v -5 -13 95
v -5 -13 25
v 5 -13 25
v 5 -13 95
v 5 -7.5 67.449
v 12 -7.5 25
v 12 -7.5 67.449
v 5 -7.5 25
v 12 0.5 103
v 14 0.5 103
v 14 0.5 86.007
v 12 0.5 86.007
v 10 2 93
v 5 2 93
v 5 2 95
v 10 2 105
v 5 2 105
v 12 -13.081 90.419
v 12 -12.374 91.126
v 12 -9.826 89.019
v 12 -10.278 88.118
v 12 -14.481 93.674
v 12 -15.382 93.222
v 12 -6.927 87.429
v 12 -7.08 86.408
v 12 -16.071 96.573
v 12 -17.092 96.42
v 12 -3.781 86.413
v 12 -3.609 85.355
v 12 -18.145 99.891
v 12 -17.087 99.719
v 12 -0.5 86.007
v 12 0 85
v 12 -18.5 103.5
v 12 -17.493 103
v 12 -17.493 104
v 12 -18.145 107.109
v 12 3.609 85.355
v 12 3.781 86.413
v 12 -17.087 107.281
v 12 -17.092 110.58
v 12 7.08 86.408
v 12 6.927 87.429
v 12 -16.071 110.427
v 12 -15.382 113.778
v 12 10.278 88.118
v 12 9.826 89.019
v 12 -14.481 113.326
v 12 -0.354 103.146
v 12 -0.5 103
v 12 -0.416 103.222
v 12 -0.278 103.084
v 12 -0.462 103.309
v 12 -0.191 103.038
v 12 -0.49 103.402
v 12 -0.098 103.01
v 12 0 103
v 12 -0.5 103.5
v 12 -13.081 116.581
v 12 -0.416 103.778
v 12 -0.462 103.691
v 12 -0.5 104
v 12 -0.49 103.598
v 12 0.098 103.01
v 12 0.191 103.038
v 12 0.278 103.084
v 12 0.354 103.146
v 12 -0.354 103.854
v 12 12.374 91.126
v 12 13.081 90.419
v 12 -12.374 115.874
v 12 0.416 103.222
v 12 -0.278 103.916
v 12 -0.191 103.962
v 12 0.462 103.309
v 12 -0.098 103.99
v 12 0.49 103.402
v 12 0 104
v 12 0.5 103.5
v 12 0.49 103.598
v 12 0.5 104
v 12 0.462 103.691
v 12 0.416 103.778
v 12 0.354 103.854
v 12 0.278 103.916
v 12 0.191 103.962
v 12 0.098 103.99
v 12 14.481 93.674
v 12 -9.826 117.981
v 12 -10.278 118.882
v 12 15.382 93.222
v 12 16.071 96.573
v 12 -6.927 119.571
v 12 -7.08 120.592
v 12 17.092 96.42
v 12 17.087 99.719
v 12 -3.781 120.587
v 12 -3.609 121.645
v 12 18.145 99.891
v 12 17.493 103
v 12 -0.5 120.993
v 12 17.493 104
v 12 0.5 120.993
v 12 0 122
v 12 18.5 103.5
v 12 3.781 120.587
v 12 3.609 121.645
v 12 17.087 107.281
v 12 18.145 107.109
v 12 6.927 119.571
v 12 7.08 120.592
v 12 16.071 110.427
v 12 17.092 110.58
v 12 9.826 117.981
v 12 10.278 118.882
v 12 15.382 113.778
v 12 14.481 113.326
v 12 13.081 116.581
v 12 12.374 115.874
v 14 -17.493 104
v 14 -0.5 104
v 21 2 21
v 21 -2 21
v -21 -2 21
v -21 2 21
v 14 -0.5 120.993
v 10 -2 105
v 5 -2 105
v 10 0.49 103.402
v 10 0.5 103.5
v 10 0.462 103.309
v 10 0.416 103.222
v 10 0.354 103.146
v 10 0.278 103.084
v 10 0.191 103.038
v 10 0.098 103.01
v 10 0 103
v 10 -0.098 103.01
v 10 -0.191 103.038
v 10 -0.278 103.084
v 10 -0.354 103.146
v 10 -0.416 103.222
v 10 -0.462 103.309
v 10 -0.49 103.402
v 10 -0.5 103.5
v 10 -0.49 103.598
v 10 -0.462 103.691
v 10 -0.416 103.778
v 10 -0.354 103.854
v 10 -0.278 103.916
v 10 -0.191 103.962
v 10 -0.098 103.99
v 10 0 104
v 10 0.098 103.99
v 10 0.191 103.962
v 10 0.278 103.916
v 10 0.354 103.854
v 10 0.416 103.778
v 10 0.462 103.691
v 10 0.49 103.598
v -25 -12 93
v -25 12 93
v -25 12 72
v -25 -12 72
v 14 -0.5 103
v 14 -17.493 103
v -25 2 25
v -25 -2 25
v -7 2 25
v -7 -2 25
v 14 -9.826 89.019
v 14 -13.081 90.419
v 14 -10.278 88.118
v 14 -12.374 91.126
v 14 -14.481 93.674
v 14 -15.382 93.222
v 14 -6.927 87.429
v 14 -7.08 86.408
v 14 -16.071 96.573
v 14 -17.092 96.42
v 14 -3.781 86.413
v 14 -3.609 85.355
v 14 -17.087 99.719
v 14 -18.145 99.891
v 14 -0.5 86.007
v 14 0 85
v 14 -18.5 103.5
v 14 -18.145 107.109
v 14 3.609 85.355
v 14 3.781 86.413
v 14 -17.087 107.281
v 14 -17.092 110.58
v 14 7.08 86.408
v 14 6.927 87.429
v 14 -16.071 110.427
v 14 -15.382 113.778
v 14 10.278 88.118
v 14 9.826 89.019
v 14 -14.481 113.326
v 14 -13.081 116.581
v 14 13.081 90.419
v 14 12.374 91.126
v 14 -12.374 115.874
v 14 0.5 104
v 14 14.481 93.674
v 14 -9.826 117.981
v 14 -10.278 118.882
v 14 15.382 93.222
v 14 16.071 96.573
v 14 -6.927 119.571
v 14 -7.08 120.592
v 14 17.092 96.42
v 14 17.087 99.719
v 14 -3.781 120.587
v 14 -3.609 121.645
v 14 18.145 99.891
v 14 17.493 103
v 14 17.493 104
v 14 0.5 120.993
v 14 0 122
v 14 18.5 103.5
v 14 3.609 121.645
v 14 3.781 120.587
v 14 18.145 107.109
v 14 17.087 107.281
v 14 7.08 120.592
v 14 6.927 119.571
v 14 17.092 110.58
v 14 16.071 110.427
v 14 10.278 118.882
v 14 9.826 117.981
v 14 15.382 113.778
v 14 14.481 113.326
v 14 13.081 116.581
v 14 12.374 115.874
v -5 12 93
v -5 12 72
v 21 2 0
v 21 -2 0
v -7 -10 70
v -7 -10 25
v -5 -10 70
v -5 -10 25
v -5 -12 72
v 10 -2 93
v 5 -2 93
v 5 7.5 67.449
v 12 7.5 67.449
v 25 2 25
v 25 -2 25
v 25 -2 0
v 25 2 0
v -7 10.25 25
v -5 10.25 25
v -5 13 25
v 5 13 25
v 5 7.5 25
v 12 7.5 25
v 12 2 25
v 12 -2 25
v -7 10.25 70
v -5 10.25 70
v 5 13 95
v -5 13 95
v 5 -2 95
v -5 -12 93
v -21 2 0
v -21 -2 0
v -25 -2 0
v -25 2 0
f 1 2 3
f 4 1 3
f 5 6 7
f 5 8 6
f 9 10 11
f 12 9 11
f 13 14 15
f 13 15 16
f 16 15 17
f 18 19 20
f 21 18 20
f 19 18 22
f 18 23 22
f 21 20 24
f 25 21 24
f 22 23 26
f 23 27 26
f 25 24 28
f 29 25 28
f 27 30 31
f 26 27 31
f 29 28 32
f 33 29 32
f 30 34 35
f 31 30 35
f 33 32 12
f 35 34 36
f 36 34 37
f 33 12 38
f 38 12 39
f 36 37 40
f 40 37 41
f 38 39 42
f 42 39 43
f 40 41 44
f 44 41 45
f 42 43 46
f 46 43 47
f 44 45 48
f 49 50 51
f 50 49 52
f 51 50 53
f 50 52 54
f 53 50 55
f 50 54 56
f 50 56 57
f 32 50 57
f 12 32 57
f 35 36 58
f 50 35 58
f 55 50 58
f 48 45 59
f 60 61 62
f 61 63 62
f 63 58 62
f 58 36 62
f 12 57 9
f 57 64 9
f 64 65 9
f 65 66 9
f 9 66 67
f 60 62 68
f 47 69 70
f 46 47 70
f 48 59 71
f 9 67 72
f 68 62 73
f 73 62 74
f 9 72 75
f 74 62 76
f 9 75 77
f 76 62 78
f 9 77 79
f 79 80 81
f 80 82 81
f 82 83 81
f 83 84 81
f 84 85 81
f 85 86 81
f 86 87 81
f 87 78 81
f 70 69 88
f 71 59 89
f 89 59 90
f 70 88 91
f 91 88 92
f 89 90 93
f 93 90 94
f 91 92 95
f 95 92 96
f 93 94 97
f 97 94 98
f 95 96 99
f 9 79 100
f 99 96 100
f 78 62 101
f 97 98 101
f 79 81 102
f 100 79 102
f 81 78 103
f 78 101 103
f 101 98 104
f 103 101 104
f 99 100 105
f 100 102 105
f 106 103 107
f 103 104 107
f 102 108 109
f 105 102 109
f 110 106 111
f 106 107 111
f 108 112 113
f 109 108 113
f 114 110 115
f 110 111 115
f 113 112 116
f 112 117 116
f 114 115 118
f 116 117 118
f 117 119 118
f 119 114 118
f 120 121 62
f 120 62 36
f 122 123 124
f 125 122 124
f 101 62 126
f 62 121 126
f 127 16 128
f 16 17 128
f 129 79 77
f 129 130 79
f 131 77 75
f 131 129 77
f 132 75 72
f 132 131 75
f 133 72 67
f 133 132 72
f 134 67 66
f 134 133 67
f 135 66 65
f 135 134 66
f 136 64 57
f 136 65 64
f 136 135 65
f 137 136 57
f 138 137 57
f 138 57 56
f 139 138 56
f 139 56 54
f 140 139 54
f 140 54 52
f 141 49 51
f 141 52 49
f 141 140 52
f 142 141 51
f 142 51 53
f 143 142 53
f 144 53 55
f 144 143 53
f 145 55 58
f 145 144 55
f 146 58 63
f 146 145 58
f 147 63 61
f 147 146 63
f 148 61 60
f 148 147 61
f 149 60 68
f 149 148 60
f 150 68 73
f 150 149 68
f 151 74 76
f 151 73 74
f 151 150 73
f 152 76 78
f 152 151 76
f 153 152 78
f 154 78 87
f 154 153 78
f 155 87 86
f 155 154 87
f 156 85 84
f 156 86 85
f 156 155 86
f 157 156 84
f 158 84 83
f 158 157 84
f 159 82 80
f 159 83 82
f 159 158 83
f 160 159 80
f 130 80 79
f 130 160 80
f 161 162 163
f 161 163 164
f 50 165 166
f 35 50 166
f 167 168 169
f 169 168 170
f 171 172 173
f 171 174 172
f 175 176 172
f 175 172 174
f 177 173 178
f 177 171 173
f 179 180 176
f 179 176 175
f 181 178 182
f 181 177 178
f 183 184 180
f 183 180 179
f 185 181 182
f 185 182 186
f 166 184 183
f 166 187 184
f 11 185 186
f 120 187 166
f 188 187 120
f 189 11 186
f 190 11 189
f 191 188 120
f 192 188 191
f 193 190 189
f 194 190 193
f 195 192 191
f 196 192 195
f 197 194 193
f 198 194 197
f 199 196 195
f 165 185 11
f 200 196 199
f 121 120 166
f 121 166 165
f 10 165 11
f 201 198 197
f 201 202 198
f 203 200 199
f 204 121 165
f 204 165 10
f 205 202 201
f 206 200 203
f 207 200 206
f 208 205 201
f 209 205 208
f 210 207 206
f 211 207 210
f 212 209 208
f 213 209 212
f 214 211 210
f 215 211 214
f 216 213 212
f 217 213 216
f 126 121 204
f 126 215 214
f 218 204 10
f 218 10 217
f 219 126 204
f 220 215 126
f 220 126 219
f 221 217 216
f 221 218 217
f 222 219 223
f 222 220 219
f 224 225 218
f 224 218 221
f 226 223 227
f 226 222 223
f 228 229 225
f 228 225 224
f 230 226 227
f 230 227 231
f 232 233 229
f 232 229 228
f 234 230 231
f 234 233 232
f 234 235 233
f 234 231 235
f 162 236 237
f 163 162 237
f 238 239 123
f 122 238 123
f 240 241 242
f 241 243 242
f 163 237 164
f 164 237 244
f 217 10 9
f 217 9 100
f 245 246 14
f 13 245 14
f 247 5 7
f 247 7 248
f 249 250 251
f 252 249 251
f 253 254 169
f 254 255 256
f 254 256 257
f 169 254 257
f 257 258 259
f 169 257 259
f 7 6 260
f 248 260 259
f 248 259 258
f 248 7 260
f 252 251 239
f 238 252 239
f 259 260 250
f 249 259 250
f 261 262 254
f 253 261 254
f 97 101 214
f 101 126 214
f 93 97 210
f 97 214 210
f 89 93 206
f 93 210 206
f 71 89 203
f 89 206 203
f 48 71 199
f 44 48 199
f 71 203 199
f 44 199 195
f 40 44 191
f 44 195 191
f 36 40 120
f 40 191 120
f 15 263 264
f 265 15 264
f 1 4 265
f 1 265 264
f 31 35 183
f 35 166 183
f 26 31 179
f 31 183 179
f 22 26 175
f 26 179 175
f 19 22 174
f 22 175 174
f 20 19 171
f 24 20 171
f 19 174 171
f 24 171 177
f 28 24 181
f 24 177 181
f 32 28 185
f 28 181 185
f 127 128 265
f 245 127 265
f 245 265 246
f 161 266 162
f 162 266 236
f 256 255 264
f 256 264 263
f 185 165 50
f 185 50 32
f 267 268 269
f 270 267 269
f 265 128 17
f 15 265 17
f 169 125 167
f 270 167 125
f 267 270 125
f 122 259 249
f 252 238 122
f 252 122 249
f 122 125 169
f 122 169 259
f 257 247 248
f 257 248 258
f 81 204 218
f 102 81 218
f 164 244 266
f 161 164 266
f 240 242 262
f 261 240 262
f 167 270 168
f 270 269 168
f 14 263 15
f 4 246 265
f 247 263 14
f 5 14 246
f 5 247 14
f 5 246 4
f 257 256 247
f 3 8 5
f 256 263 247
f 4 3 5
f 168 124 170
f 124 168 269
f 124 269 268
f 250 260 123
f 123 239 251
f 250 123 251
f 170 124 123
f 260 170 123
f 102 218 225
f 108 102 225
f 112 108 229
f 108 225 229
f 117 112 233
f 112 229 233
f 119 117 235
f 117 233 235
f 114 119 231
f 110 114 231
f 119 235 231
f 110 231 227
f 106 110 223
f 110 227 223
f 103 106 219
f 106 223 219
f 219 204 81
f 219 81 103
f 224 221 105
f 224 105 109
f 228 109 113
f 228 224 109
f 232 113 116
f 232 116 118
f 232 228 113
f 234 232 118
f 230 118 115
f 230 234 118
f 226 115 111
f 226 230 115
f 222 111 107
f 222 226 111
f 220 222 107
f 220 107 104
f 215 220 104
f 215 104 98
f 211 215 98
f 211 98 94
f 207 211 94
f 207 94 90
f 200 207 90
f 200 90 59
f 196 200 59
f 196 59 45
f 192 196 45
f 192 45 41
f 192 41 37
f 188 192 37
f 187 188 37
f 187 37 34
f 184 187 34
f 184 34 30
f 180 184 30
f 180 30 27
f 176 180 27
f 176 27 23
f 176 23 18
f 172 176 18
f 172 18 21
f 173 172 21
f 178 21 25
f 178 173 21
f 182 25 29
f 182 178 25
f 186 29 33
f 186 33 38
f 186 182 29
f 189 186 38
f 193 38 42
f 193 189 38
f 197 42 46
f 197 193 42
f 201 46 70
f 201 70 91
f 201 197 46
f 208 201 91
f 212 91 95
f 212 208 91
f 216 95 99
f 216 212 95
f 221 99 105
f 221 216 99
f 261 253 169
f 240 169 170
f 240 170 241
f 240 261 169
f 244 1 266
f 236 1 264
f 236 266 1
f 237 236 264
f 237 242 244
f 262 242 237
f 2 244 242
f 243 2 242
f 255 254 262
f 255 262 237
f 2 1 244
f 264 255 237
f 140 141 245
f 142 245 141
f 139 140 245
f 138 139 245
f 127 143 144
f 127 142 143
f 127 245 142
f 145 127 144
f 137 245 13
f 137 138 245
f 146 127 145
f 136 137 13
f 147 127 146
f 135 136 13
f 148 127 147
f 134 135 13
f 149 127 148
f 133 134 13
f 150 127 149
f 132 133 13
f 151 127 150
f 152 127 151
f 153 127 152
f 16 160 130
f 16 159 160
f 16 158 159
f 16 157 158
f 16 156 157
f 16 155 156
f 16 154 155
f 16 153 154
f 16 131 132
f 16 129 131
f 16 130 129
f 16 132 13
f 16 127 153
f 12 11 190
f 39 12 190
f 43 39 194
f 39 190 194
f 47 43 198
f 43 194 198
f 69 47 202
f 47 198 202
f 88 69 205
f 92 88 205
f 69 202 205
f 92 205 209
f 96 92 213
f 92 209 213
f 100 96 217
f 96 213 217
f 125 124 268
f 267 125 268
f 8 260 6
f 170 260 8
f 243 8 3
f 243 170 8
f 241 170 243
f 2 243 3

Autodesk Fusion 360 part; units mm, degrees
sketch "스케치1" plane through (0, 0, 0) normal (0, 1, 0) x (1, 0, 0)
  line L0 (-25, 0) -> (-25, -25)
  line L1 (-25, -25) -> (25, -25)
  line L2 (25, -25) -> (25, 0)
  line L3 (25, 0) -> (21, 0)
  line L4 (21, 0) -> (21, -21)
  line L5 (21, -21) -> (-21, -21)
  line L6 (-21, -21) -> (-21, 0)
  line L7 (-21, 0) -> (-25, 0)
extrude "돌출1" add sketch "스케치1" along normal mid plane 4
sketch "스케치2" plane through (0, 0, 25) normal (0, 0, 1) x (-1, 0, 0)
  line L0 (25, 2) -> (-25, 2)
  line L1 (5, -13) -> (-5, -13)
  line L2 (5, -13) -> (5, 0)
  line L3 (-5, -13) -> (-5, 0)
  line L4 (-20, 0) -> (-2.5, 0)
  line L5 (5, 13) -> (-5, 13)
  line L6 (5, 13) -> (5, 0)
  line L7 (-5, 13) -> (-5, 0)
extrude "돌출2" add sketch "스케치2" along normal blind 70
sketch "스케치4" plane through (5, 0, 0) normal (1, 0, 0) x (0, 1, 0)
  line L0 (7.5, 25) -> (-7.5, 25)
  line L1 (-7.5, 25) -> (-7.5, 67.4494)
  line L2 (-7.5, 67.4494) -> (7.5, 67.4494)
  line L3 (7.5, 67.4494) -> (7.5, 25)
  line L4 (2, 25) -> (13, 25)
extrude "돌출3" add sketch "스케치4" along normal blind 7
sketch "스케치5" plane through (-5, 0, 0) normal (-1, 0, 0) x (0, -1, 0)
  line L0 (-10.25, 25) -> (10, 25)
  line L1 (10, 25) -> (10, 70)
  line L2 (10, 70) -> (-10.25, 70)
  line L3 (-10.25, 70) -> (-10.25, 25)
  line L4 (-7.5, 25) -> (-13, 25)
extrude "돌출4" add sketch "스케치5" along normal blind 2
sketch "스케치7" plane through (-5, 0, 0) normal (-1, 0, 0) x (0, -1, 0)
  line L0 (-12, 72) -> (12, 72)
  line L1 (12, 72) -> (12, 93)
  line L2 (12, 93) -> (-12, 93)
  line L3 (-12, 93) -> (-12, 72)
extrude "돌출5" add sketch "스케치7" along normal blind 20
sketch "스케치10" plane through (5, 0, 0) normal (1, 0, 0) x (0, 1, 0)
  line L0 (-2, 93) -> (2, 93)
  line L1 (2, 93) -> (2, 105)
  line L2 (2, 105) -> (-2, 105)
  line L3 (-2, 105) -> (-2, 93)
  line L4 (-12, 93) -> (12, 93)
extrude "돌출7" add sketch "스케치10" along normal blind 5
sketch "스케치12" plane through (10, 0, 0) normal (1, 0, 0) x (0, 1, 0)
  circle A0 centre (0, 103.5) radius 0.5
extrude "돌출8" add sketch "스케치12" along normal blind 4
sketch "스케치13" plane through (14, 0, 0) normal (1, 0, 0) x (0, 1, 0)
  circle A0 centre (0, 103.5) radius 18.5
  circle A1 centre (0, 103.5) radius 0.5
  line L0 (-0.5, 104) -> (-0.5, 120.9929)
  line L1 (0.5, 104) -> (0.5, 120.9929)
  line L2 (-0.5, 103) -> (-17.4929, 103)
  line L3 (-0.5, 104) -> (-17.4929, 104)
  line L4 (0.5, 103) -> (0.5, 86.0071)
  line L5 (-0.5, 103) -> (-0.5, 86.0071)
  line L6 (0.5, 104) -> (17.4929, 104)
  line L7 (0.5, 103) -> (17.4929, 103)
  arc A2 (-0.5, 103.5) -> (0, 103) centre (0, 103.5) ccw
  arc A3 (-0.5, 120.9929) -> (-17.4929, 104) centre (0, 103.5) ccw
  arc A4 (17.4929, 104) -> (0.5, 120.9929) centre (0, 103.5) ccw
  arc A5 (-17.4929, 103) -> (-0.5, 86.0071) centre (0, 103.5) ccw
  arc A6 (0.5, 86.0071) -> (17.4929, 103) centre (0, 103.5) ccw
  point P0 (-0.5, 103.5)
  dimension "d23" = 17.5
  dimension "d24" = 37
extrude "돌출9" add sketch "스케치13" against normal blind 2
